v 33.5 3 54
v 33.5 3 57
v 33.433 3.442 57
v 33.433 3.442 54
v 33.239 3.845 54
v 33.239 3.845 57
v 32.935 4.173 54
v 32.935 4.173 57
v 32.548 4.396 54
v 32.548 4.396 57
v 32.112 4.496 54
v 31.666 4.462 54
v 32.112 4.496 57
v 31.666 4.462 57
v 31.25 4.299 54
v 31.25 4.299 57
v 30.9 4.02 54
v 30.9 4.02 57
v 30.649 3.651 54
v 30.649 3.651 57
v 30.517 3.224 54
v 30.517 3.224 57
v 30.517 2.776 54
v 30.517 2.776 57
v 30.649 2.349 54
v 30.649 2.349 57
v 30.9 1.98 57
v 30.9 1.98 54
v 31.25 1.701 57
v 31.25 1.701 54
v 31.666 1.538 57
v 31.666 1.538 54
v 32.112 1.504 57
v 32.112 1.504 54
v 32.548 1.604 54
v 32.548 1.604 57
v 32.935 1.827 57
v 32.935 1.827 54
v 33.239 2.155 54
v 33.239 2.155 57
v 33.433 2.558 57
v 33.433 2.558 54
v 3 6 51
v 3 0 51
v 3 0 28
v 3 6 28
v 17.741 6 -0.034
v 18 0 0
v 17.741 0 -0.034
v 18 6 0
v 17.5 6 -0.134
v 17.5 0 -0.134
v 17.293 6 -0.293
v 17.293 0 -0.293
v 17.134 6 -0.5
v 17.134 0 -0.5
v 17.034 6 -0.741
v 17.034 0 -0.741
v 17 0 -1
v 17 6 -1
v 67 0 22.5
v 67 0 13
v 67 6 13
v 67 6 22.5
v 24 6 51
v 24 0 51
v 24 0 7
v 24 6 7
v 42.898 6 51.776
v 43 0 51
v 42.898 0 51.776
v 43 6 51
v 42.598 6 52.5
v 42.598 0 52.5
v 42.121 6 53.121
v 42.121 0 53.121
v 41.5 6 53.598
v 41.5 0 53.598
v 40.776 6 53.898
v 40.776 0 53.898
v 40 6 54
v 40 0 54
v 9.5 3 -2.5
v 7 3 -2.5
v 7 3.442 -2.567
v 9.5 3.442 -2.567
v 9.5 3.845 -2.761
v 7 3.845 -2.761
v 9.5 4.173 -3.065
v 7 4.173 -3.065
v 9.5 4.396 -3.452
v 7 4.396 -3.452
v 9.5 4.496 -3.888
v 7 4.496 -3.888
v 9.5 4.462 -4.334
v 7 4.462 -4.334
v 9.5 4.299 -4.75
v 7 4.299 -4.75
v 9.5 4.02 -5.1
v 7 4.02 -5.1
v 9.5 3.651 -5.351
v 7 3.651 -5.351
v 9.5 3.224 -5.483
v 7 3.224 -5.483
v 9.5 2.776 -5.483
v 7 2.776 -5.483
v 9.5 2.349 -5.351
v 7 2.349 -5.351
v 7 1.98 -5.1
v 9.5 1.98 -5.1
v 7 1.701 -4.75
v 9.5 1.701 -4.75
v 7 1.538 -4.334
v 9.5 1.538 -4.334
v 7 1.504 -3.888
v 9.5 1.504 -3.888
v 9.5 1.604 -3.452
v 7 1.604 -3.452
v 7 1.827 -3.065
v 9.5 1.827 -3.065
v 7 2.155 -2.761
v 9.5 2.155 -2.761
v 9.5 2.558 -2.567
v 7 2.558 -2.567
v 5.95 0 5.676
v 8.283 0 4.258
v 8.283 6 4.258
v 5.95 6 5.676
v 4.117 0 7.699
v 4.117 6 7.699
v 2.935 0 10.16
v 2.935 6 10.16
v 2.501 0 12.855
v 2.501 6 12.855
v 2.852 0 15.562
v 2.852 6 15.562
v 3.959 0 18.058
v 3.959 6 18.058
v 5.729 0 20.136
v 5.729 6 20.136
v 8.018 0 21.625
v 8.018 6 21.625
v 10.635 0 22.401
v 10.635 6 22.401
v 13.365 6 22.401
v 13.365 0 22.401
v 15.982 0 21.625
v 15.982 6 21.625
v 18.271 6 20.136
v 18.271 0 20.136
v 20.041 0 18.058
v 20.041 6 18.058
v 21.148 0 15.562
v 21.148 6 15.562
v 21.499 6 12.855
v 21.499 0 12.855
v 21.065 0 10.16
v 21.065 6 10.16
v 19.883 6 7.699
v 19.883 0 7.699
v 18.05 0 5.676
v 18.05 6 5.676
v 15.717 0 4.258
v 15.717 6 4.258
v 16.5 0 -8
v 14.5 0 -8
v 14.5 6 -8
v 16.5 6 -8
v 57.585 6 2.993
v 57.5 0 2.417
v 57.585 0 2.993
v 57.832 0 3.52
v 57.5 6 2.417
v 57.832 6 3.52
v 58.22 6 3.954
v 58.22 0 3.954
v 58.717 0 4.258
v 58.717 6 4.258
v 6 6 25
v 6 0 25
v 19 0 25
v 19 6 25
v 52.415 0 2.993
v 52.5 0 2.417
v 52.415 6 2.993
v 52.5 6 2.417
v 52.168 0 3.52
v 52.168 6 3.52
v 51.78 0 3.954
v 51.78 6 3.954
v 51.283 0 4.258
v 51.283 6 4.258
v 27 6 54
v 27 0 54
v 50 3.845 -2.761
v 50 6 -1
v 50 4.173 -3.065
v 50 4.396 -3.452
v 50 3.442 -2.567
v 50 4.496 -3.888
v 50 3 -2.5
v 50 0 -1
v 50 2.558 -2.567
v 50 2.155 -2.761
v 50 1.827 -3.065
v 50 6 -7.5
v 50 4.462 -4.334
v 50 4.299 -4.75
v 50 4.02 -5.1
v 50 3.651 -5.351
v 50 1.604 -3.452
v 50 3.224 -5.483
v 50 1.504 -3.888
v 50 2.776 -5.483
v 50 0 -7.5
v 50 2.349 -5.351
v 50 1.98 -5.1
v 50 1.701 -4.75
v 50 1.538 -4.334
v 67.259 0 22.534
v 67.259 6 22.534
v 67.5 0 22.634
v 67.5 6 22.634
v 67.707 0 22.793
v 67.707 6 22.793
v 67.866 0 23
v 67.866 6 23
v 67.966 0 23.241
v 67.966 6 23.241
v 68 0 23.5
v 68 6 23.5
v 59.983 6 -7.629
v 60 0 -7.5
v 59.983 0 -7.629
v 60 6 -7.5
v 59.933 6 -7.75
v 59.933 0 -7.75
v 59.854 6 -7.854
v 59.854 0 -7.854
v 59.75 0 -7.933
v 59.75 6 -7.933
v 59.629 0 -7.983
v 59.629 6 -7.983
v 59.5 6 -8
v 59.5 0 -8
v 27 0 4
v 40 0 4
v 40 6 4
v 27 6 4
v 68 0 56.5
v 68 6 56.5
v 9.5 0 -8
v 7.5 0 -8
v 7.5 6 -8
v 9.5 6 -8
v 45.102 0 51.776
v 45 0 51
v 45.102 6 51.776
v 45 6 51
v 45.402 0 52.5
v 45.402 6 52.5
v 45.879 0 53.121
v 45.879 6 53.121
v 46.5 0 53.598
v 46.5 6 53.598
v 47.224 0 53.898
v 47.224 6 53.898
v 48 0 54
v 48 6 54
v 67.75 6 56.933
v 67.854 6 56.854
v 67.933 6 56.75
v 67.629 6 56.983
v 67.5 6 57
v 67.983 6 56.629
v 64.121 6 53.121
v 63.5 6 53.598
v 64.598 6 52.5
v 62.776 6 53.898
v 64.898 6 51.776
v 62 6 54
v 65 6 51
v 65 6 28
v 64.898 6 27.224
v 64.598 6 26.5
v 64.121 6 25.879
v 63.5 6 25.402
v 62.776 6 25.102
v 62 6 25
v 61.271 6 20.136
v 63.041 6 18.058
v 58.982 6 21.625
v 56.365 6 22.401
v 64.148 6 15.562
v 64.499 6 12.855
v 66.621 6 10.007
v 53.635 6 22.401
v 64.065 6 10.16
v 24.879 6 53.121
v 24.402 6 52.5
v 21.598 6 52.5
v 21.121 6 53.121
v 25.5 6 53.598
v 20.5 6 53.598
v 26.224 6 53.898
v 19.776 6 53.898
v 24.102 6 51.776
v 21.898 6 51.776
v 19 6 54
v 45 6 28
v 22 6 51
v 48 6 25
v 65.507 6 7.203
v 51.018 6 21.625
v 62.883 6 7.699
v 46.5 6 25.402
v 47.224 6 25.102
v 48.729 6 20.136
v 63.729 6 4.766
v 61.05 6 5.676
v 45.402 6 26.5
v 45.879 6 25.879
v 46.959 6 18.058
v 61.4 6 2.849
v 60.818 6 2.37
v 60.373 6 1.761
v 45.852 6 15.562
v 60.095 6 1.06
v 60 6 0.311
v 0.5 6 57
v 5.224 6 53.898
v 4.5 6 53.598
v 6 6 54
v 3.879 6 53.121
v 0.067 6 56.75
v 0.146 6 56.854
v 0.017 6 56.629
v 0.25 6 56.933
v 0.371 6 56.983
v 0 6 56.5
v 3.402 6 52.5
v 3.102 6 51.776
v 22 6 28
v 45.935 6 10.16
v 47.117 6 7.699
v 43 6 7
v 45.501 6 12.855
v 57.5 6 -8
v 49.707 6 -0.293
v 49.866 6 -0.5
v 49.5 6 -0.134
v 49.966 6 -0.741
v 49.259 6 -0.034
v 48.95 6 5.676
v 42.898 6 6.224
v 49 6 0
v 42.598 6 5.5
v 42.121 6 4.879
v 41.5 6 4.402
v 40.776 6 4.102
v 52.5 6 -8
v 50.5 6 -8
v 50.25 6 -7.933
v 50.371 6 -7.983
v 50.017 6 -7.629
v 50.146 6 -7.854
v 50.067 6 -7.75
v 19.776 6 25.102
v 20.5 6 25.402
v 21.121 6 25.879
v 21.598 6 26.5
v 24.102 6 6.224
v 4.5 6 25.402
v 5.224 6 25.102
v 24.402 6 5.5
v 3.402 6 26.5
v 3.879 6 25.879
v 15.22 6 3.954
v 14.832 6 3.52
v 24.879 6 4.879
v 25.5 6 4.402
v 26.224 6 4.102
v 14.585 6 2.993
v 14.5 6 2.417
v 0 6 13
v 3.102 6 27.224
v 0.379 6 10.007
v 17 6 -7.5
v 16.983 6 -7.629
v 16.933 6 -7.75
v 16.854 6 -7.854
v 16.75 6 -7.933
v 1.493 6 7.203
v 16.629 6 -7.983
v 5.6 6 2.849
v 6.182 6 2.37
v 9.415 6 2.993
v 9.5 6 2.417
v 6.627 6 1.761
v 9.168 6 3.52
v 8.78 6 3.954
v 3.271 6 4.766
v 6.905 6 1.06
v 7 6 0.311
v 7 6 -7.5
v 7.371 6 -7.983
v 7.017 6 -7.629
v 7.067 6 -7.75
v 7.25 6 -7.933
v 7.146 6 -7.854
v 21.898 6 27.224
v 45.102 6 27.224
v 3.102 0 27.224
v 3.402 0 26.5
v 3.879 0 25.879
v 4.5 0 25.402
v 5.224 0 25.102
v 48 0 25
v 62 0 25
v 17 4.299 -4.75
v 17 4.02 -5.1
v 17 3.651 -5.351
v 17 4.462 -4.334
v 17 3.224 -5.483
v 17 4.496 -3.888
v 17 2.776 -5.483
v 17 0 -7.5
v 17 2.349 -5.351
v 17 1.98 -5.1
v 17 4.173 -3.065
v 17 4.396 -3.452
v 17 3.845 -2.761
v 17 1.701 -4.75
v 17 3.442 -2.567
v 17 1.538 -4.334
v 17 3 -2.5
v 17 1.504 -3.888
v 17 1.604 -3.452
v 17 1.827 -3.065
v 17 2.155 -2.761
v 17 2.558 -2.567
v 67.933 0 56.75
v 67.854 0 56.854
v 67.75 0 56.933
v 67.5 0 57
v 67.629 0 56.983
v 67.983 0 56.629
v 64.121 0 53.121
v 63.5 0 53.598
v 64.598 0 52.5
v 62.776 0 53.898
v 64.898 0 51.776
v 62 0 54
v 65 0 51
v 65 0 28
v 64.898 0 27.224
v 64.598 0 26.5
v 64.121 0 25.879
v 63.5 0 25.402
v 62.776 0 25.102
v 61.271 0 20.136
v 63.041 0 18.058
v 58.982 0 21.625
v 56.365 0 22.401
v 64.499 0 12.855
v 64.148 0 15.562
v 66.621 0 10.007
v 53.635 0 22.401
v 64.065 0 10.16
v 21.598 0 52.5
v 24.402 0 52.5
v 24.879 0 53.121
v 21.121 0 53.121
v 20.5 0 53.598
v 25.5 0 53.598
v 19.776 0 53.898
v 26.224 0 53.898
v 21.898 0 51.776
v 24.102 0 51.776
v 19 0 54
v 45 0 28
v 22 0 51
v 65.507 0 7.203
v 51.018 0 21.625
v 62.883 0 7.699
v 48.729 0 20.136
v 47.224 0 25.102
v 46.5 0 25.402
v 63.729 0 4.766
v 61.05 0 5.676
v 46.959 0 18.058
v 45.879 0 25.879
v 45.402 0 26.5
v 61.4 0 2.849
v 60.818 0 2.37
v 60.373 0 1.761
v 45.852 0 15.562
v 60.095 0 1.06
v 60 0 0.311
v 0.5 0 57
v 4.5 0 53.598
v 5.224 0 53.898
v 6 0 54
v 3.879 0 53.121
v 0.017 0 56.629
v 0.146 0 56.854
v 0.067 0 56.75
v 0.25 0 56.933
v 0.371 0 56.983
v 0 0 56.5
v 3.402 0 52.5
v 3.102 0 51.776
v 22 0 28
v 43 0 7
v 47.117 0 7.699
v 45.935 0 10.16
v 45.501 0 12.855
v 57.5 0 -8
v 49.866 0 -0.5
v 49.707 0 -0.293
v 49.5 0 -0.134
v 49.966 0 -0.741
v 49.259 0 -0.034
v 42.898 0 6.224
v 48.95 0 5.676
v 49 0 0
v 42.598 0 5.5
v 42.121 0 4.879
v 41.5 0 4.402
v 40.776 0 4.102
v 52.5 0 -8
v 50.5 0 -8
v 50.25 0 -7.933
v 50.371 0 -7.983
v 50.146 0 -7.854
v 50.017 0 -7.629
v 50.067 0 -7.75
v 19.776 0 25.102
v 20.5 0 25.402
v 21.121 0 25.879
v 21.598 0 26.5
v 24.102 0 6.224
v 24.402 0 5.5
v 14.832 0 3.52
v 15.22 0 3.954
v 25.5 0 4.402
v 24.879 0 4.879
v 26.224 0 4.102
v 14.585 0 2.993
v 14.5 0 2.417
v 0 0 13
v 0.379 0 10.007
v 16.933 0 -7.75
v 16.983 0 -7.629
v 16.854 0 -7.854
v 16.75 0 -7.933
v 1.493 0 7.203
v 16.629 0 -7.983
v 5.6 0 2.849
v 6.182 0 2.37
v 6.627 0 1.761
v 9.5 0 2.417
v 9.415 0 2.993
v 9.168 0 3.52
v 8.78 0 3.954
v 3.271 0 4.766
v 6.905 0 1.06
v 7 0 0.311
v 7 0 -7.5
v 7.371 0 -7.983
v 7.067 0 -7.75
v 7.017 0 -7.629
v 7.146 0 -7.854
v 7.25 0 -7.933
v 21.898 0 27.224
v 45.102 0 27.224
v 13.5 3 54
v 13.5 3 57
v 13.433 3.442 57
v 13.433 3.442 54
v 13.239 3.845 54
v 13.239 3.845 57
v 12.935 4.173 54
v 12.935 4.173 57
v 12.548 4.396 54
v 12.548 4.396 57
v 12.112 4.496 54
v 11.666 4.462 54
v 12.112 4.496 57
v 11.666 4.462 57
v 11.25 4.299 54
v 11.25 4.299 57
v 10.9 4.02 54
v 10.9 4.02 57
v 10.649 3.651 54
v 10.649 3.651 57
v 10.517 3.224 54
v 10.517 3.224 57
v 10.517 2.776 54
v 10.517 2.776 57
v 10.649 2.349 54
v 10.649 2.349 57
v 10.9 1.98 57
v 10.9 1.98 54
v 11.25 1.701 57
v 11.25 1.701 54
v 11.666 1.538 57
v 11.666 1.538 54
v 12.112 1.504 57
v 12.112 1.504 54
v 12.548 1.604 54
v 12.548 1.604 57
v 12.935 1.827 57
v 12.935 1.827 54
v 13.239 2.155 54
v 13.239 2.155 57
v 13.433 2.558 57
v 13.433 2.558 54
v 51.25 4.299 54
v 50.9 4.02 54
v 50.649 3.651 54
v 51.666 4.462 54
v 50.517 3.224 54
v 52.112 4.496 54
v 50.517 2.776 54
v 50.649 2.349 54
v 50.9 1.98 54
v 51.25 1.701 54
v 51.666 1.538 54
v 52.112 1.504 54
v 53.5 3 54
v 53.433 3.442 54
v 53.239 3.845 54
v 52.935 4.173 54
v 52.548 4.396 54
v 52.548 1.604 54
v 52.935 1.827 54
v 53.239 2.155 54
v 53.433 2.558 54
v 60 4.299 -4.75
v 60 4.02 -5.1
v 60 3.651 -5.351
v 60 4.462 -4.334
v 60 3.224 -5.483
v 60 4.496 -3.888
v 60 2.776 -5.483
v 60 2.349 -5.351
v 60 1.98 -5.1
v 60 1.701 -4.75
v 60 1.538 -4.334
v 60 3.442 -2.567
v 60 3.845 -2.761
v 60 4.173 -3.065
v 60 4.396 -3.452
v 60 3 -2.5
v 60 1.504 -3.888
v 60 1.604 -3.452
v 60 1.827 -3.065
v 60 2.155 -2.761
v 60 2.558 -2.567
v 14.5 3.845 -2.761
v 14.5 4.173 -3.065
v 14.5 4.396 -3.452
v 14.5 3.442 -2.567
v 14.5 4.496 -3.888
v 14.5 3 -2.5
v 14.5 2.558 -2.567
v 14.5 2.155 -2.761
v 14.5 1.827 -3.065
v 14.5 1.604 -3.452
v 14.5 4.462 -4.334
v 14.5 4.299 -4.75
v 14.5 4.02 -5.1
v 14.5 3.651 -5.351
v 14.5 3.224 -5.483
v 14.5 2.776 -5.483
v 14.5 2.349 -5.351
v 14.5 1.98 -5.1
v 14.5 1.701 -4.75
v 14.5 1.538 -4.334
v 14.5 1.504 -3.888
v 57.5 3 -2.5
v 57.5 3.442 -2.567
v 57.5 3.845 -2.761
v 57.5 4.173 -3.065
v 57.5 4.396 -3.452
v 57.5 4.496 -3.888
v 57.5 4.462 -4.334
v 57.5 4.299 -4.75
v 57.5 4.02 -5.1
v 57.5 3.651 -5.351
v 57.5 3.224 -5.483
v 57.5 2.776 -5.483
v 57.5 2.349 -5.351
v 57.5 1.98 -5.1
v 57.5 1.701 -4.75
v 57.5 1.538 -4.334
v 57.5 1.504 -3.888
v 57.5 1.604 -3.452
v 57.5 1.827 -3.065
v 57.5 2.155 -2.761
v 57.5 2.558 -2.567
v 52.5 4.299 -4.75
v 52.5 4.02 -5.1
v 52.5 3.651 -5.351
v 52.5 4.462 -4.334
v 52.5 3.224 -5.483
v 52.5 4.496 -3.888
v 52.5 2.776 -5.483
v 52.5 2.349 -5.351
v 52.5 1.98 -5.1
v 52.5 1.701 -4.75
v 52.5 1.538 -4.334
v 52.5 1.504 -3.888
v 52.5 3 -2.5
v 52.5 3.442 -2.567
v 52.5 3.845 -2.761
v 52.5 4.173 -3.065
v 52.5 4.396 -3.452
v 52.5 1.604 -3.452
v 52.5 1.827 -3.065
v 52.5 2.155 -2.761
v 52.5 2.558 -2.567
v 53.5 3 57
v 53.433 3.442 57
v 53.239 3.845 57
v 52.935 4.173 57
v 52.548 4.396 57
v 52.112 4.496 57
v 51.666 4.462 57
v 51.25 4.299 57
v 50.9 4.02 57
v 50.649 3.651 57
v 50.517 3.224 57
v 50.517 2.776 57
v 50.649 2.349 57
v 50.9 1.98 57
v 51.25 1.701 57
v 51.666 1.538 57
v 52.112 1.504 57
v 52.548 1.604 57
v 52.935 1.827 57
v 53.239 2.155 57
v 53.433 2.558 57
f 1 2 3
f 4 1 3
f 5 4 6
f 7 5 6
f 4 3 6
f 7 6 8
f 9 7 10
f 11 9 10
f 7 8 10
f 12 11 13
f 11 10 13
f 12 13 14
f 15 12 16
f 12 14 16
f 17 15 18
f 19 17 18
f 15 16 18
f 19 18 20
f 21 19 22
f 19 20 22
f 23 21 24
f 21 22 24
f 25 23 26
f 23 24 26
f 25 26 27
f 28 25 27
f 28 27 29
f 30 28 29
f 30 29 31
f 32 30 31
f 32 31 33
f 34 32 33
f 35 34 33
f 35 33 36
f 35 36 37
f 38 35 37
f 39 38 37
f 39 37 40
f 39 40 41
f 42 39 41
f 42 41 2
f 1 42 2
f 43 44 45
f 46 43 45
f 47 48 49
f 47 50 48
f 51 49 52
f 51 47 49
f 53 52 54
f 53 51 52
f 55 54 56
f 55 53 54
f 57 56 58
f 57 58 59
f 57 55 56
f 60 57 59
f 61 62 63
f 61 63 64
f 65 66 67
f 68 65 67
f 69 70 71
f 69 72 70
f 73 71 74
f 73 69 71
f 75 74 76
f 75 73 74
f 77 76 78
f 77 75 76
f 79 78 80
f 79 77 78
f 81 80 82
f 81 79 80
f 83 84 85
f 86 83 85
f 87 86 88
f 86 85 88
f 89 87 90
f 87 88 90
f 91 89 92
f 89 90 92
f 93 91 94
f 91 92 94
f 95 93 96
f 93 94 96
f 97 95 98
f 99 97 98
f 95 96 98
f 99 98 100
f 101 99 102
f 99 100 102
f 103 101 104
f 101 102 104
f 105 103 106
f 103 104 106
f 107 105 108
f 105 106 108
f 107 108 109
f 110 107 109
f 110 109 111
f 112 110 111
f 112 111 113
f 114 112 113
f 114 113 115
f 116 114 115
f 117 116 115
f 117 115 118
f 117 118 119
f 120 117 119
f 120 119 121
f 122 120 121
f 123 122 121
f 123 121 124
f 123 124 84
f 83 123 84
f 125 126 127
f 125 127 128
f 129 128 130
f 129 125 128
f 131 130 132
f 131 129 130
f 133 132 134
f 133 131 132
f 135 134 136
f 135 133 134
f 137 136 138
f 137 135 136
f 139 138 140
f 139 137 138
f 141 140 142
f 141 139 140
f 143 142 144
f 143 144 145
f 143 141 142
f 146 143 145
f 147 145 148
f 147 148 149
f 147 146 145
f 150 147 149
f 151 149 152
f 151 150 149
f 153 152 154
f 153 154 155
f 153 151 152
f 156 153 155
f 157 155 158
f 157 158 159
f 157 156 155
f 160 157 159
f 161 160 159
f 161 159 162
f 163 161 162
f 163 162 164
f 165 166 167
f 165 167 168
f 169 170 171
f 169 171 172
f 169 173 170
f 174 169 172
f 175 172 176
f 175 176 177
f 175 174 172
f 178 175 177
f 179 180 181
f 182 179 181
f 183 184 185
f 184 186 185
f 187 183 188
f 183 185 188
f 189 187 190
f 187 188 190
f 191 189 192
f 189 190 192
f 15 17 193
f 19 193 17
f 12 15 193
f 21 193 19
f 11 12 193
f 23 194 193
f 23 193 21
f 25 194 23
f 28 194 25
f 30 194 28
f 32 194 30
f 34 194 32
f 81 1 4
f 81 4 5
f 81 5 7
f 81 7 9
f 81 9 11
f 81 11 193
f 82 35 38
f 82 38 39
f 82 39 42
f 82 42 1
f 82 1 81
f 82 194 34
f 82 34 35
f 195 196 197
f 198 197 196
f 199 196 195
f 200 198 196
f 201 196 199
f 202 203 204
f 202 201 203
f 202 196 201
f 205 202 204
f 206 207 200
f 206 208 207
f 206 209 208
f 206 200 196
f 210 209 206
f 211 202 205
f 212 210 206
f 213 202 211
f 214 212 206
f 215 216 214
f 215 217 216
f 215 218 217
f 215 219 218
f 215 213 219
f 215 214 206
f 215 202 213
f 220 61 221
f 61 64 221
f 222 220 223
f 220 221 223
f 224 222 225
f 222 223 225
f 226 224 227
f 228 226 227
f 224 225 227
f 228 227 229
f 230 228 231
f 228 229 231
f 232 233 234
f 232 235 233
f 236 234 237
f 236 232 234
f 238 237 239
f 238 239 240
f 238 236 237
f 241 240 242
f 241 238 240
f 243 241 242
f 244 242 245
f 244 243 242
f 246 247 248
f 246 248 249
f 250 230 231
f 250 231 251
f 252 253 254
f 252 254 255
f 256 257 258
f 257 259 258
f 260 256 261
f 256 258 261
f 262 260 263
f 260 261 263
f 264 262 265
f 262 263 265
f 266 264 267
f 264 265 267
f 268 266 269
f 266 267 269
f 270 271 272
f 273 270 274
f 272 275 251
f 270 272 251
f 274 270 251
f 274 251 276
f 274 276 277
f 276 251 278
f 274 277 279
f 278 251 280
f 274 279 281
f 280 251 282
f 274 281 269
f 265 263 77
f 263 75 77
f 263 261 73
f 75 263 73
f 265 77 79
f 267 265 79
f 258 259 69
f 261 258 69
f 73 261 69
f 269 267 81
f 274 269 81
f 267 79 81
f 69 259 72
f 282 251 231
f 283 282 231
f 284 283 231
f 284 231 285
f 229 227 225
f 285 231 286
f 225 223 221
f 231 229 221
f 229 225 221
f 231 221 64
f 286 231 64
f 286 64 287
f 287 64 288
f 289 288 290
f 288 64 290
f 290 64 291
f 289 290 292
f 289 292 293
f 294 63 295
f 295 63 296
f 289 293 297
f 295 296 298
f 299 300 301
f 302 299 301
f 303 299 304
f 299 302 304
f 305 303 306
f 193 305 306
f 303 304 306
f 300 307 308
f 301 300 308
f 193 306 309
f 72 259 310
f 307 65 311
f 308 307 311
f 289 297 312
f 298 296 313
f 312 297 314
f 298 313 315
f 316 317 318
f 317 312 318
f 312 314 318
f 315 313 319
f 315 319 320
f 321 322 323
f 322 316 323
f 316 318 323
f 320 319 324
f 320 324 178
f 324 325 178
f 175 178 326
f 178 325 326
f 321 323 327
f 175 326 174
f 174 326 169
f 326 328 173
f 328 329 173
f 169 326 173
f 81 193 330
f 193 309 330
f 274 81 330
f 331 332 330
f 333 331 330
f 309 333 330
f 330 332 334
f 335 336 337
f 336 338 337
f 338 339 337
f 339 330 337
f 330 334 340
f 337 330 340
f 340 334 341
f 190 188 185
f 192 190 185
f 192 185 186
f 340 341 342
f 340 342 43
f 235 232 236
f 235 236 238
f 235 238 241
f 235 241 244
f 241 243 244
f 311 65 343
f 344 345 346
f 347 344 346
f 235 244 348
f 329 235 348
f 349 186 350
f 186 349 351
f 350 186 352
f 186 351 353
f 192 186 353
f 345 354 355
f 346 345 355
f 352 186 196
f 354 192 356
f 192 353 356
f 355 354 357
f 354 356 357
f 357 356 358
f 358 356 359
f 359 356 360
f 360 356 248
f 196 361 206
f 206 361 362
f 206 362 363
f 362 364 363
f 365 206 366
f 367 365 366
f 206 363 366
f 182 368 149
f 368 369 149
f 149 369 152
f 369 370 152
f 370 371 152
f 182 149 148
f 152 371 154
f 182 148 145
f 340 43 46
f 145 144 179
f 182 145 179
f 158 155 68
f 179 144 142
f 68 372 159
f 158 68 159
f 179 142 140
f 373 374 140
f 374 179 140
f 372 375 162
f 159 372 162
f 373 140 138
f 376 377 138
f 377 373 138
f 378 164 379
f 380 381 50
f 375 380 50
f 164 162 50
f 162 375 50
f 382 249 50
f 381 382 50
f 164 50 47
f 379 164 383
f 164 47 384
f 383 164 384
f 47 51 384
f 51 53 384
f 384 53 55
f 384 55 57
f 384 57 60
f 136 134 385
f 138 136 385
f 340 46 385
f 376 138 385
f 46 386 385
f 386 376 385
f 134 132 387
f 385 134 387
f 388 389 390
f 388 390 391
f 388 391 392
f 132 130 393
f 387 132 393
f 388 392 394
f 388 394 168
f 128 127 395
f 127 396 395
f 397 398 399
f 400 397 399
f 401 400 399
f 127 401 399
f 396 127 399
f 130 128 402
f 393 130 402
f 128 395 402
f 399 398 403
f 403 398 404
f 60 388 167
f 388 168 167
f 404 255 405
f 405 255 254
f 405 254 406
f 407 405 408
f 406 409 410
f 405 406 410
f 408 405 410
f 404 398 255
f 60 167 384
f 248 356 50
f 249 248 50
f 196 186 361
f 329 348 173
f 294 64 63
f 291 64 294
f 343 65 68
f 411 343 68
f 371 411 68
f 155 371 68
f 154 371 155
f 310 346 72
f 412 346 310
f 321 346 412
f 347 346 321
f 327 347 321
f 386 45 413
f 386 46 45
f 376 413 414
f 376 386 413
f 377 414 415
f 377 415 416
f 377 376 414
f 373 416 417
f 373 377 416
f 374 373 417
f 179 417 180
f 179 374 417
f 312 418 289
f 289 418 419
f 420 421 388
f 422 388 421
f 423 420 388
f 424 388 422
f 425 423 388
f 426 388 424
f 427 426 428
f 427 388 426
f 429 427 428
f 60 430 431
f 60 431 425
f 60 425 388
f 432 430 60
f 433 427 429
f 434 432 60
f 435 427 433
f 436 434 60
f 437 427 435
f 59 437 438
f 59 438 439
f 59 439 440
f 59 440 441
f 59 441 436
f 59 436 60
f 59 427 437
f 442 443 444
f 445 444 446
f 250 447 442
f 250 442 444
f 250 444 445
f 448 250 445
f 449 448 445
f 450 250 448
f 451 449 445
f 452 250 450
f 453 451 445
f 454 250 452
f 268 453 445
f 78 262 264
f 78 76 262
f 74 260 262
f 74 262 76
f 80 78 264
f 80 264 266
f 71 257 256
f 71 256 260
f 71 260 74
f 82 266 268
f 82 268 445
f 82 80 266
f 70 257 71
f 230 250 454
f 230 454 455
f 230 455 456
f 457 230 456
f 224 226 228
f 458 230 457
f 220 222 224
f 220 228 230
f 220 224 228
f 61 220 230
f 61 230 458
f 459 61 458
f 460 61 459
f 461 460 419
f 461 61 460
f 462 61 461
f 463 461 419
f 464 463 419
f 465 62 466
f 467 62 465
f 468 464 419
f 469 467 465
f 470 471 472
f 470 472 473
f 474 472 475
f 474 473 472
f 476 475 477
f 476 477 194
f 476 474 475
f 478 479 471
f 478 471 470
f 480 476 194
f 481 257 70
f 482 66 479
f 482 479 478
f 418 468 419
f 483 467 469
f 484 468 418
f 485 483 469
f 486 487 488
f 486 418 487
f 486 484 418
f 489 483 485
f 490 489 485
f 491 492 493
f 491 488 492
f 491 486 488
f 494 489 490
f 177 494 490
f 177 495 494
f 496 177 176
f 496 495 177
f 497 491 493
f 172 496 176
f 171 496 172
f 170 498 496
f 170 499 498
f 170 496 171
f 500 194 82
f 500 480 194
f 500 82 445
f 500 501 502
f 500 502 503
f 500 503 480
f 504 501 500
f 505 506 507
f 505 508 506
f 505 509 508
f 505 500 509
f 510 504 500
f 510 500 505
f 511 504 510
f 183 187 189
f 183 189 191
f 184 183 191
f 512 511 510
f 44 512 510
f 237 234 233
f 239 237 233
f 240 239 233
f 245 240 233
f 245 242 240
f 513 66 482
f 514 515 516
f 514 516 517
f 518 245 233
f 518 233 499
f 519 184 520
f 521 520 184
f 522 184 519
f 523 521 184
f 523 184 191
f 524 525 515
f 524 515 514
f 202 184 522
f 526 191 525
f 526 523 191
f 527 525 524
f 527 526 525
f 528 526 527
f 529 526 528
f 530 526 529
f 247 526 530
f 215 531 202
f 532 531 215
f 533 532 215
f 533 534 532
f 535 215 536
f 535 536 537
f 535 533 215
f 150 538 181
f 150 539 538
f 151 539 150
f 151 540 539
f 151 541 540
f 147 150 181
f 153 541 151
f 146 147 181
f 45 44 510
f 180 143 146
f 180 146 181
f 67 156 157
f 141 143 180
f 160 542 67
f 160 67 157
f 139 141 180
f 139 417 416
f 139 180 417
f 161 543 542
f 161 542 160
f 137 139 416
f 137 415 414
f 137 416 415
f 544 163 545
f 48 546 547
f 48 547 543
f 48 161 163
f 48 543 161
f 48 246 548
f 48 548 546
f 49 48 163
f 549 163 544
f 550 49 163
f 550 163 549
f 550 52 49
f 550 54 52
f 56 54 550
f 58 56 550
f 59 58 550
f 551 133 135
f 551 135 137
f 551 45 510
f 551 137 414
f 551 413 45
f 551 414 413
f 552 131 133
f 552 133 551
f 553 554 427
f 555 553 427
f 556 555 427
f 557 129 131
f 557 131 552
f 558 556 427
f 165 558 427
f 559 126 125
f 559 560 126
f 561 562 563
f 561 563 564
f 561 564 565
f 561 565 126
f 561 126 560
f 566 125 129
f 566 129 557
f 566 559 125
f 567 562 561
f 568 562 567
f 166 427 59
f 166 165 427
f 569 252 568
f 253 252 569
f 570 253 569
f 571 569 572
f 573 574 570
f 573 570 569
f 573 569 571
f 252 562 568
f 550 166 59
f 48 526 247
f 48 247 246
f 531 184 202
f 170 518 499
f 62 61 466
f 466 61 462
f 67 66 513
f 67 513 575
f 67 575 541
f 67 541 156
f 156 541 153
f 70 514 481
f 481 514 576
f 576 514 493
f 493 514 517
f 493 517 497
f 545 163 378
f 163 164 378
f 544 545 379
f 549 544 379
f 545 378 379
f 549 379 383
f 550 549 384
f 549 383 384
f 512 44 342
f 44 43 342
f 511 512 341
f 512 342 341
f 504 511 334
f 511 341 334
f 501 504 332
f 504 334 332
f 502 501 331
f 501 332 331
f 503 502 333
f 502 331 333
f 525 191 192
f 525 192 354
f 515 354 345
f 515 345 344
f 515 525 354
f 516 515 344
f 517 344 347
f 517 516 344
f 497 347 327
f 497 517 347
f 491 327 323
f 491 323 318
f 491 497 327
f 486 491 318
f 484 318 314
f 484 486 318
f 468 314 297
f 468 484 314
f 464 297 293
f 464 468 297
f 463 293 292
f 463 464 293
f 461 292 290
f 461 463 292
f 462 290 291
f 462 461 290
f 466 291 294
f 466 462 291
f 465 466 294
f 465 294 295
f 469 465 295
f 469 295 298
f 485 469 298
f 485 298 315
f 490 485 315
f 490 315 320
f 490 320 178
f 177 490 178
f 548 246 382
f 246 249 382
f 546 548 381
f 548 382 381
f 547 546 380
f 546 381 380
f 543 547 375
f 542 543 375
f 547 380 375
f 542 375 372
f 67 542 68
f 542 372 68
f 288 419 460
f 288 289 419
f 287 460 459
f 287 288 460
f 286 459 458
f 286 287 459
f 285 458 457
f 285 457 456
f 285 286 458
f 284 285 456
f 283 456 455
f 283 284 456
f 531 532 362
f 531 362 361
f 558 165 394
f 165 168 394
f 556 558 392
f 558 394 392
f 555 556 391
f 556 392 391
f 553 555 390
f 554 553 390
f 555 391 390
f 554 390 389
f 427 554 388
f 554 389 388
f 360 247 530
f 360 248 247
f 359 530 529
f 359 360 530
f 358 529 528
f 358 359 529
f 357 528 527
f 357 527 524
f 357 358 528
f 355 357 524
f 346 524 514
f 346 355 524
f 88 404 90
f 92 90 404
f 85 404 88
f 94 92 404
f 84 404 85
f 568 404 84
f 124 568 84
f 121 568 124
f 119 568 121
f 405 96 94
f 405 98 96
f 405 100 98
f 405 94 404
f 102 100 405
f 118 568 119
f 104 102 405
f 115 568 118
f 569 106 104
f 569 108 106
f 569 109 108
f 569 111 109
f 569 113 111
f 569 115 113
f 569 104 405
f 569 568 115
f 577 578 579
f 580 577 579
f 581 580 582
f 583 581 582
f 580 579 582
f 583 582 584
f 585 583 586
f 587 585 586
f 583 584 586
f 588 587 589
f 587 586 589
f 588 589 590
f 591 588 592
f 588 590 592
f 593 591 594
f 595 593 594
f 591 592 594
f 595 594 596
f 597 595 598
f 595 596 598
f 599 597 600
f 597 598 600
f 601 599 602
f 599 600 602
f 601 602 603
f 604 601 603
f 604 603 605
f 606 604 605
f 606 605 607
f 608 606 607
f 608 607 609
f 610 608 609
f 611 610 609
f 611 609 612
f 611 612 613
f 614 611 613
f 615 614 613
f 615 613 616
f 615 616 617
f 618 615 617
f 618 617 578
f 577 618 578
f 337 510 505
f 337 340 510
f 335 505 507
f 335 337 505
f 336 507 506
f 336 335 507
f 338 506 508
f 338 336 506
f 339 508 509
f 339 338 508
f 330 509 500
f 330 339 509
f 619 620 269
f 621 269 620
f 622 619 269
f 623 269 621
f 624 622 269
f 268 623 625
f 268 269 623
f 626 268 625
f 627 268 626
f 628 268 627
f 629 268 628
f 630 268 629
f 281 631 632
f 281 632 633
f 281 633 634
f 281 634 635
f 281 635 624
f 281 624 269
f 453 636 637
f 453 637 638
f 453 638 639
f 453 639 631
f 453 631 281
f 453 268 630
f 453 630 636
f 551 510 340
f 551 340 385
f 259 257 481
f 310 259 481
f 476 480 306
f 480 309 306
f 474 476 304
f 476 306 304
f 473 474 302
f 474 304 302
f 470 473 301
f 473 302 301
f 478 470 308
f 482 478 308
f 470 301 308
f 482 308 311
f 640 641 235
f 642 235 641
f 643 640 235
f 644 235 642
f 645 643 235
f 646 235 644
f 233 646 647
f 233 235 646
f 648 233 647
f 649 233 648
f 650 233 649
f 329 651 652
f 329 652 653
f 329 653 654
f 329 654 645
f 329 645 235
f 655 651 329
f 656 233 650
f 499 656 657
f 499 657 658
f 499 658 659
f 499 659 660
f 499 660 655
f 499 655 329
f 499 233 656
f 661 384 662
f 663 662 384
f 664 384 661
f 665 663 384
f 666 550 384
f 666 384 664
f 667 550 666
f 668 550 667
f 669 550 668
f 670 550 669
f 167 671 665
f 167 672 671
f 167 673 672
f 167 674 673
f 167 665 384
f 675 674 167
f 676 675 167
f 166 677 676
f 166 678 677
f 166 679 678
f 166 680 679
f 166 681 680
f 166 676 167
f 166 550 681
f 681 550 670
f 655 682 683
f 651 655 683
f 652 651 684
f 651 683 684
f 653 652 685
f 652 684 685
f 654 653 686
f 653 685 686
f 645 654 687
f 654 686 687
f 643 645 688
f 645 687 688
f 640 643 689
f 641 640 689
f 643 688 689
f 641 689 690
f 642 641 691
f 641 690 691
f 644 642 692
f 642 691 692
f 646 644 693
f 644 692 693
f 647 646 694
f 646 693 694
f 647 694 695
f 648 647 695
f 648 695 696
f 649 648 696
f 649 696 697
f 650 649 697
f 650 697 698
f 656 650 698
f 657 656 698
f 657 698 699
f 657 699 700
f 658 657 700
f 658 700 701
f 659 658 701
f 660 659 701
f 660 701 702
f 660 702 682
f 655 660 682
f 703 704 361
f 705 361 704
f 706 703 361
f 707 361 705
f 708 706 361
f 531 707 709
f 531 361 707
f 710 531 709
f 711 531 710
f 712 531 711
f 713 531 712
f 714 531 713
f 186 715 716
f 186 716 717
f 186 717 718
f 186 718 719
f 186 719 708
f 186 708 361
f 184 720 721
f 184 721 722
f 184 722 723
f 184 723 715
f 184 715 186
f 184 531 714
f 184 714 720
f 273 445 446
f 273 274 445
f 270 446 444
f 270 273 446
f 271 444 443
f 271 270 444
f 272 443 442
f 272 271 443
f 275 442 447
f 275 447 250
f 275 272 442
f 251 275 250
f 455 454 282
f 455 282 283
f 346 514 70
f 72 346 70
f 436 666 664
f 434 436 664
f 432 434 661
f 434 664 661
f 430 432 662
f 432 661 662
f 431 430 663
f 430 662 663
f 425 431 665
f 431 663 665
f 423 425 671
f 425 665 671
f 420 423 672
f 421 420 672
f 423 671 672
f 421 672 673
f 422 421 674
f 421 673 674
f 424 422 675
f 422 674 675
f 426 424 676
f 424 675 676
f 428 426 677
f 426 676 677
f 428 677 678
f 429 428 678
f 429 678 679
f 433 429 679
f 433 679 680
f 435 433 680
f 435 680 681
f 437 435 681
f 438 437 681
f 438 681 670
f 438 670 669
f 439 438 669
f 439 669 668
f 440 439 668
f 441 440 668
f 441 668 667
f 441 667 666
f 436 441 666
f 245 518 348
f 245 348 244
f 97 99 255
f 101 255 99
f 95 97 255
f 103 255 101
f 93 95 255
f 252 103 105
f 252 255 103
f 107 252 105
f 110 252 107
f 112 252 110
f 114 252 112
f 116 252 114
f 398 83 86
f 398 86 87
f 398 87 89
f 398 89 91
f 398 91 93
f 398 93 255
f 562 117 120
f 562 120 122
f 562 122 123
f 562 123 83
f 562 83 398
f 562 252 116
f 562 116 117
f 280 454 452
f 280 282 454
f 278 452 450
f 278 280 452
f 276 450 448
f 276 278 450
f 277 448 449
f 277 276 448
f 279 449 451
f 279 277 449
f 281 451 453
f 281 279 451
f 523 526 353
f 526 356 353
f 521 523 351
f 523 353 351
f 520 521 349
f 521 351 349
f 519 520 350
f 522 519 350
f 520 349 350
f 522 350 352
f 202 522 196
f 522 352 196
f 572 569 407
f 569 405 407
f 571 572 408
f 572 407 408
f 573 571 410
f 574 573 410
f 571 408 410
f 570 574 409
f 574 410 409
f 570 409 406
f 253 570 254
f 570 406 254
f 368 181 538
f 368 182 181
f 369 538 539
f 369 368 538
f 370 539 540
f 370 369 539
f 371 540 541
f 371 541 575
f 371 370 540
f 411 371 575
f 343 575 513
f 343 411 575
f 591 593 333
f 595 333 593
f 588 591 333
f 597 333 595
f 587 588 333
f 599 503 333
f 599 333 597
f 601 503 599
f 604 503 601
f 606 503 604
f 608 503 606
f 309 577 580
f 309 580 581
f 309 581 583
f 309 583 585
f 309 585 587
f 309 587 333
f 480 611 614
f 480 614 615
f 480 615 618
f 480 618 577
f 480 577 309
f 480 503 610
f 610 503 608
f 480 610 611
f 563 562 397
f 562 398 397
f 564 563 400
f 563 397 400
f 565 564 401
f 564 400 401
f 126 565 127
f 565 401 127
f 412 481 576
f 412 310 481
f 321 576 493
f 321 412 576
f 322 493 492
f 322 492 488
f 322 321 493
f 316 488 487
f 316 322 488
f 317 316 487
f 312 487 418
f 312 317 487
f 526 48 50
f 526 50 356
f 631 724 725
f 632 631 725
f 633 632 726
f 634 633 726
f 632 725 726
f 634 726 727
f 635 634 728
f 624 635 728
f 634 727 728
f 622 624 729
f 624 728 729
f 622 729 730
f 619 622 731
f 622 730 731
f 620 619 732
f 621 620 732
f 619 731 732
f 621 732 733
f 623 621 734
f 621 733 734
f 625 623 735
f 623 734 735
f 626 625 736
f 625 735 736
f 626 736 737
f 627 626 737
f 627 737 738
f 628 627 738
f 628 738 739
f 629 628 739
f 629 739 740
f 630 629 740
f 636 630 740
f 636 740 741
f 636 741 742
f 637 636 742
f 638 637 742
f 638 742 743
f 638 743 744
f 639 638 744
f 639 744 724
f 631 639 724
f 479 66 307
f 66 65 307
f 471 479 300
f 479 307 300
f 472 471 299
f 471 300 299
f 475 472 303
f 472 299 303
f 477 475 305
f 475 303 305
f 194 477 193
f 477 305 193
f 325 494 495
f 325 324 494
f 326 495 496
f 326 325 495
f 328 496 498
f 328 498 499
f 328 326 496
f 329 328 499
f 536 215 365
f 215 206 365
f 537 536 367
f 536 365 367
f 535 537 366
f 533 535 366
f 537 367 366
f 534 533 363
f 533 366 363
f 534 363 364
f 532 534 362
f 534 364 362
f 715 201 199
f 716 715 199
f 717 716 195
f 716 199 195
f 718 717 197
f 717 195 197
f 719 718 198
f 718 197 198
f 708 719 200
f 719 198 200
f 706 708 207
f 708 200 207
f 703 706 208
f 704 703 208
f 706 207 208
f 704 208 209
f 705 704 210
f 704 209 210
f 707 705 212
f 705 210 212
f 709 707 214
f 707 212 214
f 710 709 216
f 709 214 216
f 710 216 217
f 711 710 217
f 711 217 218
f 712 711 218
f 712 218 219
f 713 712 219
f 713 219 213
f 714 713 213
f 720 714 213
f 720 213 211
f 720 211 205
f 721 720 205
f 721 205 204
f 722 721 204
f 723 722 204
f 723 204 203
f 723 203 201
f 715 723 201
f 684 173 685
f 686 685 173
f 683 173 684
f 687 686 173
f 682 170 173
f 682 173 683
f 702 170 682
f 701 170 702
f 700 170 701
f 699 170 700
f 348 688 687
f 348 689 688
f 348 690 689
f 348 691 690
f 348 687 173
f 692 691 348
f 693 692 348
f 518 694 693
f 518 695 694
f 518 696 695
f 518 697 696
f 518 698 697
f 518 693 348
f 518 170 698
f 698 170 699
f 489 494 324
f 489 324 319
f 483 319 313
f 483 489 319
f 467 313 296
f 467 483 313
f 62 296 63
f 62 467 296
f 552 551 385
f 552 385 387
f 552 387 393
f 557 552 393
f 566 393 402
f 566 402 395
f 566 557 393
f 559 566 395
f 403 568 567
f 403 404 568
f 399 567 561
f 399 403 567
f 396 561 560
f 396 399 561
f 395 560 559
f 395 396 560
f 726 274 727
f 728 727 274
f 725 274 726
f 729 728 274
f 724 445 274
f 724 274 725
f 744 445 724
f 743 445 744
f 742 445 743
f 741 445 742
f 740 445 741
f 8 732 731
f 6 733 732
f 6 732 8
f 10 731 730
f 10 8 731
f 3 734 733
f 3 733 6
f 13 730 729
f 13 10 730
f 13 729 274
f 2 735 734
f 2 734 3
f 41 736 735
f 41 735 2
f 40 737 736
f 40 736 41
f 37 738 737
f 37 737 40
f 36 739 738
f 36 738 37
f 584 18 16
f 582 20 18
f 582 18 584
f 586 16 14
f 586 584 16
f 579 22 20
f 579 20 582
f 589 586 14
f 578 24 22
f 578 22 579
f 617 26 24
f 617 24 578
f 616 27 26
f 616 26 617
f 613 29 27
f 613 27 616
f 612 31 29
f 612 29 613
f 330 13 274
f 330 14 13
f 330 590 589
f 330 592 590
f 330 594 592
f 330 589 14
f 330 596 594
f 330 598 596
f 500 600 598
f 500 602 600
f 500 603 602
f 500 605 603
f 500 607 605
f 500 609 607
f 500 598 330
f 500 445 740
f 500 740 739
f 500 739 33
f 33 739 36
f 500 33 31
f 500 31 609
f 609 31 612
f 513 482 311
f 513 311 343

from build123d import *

# Parameters (mm, degrees)
SKETCH_1_W          = 19
SKETCH_1_H          = 29
SKETCH_1_W_2        = 20
EXTRUDE_1_DEPTH     = 6
SKETCH_3_R          = 1.5
CUT_EXTRUDE_1_DEPTH = 10
FILLET_1_R          = 3
FILLET_2_R          = 1
SKETCH_4_R          = 1.5
CUT_EXTRUDE_2_DEPTH = 72
FILLET_3_R          = 0.5
FILLET_4_R          = 0.5
FILLET_5_R          = 3
FILLET_6_R          = 2


with BuildPart() as part:
    # 草图1 → 凸台-拉伸1 (new body)
    with BuildSketch(Plane(origin=(0, 0, 0), x_dir=(1, 0, 0), z_dir=(0, 1, 0))):
        with BuildLine():
            Line((17, 0), (50, 0))
            Line((50, 0), (50, 8))
            Line((50, 8), (52.5, 8))
            Line((52.5, 8), (52.5, -3.83484861))
            ThreePointArc((52.5, -3.83484861), (55, -22.5), (57.5, -3.83484861))
            Line((57.5, -3.83484861), (57.5, 8))
            Line((57.5, 8), (60, 8))
            Line((60, 8), (60, -2.091287885))
            ThreePointArc((60, -2.091287885), (65.099504938, -6.519259302), (67, -13))
            Line((67, -13), (67, -22.5))
            Line((67, -22.5), (68, -22.5))
            Line((68, -22.5), (68, -57))
            Line((68, -57), (0, -57))
            Line((0, -57), (0, -13))
            ThreePointArc((0, -13), (1.900495062, -6.519259302), (7, -2.091287885))
            Line((7, -2.091287885), (7, 8))
            Line((7, 8), (9.5, 8))
            Line((9.5, 8), (9.5, -3.83484861))
            ThreePointArc((9.5, -3.83484861), (12, -22.5), (14.5, -3.83484861))
            Line((14.5, -3.83484861), (14.5, 8))
            Line((14.5, 8), (17, 8))
            Line((17, 8), (17, 0))
        make_face()
        with Locations((12.5, -39.5)):
            Rectangle(SKETCH_1_W, SKETCH_1_H, mode=Mode.SUBTRACT)
        Polygon((24, -25), (24, -54), (43, -54), (43, -25), (43, -4), (24, -4), align=None, mode=Mode.SUBTRACT)
        with Locations((55, -39.5)):
            Rectangle(SKETCH_1_W_2, SKETCH_1_H, mode=Mode.SUBTRACT)
    extrude(amount=EXTRUDE_1_DEPTH)

    # 草图3 → 切除-拉伸1 (cut)
    with BuildSketch(Plane.XY.offset(57)):
        with Locations((12, 3)):
            Circle(SKETCH_3_R)
        with Locations((32, 3)):
            Circle(SKETCH_3_R)
        with Locations((52, 3)):
            Circle(SKETCH_3_R)
    extrude(amount=-CUT_EXTRUDE_1_DEPTH, mode=Mode.SUBTRACT)

    # 圆角1
    fillet_1_edges = [part.edges().sort_by_distance(p)[0] for p in [
        (22, 3, 25),
        (3, 3, 25),
        (3, 3, 54),
        (22, 3, 54),
        (24, 3, 4),
        (24, 3, 54),
        (43, 3, 54),
        (43, 3, 4),
        (45, 3, 54),
        (65, 3, 54),
        (65, 3, 25),
        (45, 3, 25),
    ]]
    fillet(fillet_1_edges, radius=FILLET_1_R)

    # 圆角2
    fillet_2_edges = [part.edges().sort_by_distance(p)[0] for p in [
        (50, 3, 0),
        (17, 3, 0),
        (68, 3, 22.5),
    ]]
    fillet(fillet_2_edges, radius=FILLET_2_R - 0.0001)  # a hair under: the kernel refuses the full size

    # 草图4 → 切除-拉伸2 (cut)
    with BuildSketch(Plane.ZY.offset(-7)):
        with Locations((-4, 3)):
            Circle(SKETCH_4_R)
    extrude(amount=-CUT_EXTRUDE_2_DEPTH, mode=Mode.SUBTRACT)

    # 圆角3
    fillet_3_edges = [part.edges().sort_by_distance(p)[0] for p in [
        (68, 3, 57),
        (0, 3, 57),
    ]]
    fillet(fillet_3_edges, radius=FILLET_3_R)

    # 圆角4
    fillet_4_edges = [part.edges().sort_by_distance(p)[0] for p in [
        (7, 3, -8),
        (17, 3, -8),
        (50, 3, -8),
        (60, 3, -8),
    ]]
    fillet(fillet_4_edges, radius=FILLET_4_R)

    # 圆角5
    fillet_5_edges = [part.edges().sort_by_distance(p)[0] for p in [
        (7, 3, 2.091287885),
        (60, 3, 2.091287885),
    ]]
    fillet(fillet_5_edges, radius=FILLET_5_R)

    # 圆角6
    fillet_6_edges = [part.edges().sort_by_distance(p)[0] for p in [
        (9.5, 3, 3.83484861),
        (14.5, 3, 3.83484861),
        (52.5, 3, 3.83484861),
        (57.5, 3, 3.83484861),
    ]]
    fillet(fillet_6_edges, radius=FILLET_6_R)


solid = part.part
